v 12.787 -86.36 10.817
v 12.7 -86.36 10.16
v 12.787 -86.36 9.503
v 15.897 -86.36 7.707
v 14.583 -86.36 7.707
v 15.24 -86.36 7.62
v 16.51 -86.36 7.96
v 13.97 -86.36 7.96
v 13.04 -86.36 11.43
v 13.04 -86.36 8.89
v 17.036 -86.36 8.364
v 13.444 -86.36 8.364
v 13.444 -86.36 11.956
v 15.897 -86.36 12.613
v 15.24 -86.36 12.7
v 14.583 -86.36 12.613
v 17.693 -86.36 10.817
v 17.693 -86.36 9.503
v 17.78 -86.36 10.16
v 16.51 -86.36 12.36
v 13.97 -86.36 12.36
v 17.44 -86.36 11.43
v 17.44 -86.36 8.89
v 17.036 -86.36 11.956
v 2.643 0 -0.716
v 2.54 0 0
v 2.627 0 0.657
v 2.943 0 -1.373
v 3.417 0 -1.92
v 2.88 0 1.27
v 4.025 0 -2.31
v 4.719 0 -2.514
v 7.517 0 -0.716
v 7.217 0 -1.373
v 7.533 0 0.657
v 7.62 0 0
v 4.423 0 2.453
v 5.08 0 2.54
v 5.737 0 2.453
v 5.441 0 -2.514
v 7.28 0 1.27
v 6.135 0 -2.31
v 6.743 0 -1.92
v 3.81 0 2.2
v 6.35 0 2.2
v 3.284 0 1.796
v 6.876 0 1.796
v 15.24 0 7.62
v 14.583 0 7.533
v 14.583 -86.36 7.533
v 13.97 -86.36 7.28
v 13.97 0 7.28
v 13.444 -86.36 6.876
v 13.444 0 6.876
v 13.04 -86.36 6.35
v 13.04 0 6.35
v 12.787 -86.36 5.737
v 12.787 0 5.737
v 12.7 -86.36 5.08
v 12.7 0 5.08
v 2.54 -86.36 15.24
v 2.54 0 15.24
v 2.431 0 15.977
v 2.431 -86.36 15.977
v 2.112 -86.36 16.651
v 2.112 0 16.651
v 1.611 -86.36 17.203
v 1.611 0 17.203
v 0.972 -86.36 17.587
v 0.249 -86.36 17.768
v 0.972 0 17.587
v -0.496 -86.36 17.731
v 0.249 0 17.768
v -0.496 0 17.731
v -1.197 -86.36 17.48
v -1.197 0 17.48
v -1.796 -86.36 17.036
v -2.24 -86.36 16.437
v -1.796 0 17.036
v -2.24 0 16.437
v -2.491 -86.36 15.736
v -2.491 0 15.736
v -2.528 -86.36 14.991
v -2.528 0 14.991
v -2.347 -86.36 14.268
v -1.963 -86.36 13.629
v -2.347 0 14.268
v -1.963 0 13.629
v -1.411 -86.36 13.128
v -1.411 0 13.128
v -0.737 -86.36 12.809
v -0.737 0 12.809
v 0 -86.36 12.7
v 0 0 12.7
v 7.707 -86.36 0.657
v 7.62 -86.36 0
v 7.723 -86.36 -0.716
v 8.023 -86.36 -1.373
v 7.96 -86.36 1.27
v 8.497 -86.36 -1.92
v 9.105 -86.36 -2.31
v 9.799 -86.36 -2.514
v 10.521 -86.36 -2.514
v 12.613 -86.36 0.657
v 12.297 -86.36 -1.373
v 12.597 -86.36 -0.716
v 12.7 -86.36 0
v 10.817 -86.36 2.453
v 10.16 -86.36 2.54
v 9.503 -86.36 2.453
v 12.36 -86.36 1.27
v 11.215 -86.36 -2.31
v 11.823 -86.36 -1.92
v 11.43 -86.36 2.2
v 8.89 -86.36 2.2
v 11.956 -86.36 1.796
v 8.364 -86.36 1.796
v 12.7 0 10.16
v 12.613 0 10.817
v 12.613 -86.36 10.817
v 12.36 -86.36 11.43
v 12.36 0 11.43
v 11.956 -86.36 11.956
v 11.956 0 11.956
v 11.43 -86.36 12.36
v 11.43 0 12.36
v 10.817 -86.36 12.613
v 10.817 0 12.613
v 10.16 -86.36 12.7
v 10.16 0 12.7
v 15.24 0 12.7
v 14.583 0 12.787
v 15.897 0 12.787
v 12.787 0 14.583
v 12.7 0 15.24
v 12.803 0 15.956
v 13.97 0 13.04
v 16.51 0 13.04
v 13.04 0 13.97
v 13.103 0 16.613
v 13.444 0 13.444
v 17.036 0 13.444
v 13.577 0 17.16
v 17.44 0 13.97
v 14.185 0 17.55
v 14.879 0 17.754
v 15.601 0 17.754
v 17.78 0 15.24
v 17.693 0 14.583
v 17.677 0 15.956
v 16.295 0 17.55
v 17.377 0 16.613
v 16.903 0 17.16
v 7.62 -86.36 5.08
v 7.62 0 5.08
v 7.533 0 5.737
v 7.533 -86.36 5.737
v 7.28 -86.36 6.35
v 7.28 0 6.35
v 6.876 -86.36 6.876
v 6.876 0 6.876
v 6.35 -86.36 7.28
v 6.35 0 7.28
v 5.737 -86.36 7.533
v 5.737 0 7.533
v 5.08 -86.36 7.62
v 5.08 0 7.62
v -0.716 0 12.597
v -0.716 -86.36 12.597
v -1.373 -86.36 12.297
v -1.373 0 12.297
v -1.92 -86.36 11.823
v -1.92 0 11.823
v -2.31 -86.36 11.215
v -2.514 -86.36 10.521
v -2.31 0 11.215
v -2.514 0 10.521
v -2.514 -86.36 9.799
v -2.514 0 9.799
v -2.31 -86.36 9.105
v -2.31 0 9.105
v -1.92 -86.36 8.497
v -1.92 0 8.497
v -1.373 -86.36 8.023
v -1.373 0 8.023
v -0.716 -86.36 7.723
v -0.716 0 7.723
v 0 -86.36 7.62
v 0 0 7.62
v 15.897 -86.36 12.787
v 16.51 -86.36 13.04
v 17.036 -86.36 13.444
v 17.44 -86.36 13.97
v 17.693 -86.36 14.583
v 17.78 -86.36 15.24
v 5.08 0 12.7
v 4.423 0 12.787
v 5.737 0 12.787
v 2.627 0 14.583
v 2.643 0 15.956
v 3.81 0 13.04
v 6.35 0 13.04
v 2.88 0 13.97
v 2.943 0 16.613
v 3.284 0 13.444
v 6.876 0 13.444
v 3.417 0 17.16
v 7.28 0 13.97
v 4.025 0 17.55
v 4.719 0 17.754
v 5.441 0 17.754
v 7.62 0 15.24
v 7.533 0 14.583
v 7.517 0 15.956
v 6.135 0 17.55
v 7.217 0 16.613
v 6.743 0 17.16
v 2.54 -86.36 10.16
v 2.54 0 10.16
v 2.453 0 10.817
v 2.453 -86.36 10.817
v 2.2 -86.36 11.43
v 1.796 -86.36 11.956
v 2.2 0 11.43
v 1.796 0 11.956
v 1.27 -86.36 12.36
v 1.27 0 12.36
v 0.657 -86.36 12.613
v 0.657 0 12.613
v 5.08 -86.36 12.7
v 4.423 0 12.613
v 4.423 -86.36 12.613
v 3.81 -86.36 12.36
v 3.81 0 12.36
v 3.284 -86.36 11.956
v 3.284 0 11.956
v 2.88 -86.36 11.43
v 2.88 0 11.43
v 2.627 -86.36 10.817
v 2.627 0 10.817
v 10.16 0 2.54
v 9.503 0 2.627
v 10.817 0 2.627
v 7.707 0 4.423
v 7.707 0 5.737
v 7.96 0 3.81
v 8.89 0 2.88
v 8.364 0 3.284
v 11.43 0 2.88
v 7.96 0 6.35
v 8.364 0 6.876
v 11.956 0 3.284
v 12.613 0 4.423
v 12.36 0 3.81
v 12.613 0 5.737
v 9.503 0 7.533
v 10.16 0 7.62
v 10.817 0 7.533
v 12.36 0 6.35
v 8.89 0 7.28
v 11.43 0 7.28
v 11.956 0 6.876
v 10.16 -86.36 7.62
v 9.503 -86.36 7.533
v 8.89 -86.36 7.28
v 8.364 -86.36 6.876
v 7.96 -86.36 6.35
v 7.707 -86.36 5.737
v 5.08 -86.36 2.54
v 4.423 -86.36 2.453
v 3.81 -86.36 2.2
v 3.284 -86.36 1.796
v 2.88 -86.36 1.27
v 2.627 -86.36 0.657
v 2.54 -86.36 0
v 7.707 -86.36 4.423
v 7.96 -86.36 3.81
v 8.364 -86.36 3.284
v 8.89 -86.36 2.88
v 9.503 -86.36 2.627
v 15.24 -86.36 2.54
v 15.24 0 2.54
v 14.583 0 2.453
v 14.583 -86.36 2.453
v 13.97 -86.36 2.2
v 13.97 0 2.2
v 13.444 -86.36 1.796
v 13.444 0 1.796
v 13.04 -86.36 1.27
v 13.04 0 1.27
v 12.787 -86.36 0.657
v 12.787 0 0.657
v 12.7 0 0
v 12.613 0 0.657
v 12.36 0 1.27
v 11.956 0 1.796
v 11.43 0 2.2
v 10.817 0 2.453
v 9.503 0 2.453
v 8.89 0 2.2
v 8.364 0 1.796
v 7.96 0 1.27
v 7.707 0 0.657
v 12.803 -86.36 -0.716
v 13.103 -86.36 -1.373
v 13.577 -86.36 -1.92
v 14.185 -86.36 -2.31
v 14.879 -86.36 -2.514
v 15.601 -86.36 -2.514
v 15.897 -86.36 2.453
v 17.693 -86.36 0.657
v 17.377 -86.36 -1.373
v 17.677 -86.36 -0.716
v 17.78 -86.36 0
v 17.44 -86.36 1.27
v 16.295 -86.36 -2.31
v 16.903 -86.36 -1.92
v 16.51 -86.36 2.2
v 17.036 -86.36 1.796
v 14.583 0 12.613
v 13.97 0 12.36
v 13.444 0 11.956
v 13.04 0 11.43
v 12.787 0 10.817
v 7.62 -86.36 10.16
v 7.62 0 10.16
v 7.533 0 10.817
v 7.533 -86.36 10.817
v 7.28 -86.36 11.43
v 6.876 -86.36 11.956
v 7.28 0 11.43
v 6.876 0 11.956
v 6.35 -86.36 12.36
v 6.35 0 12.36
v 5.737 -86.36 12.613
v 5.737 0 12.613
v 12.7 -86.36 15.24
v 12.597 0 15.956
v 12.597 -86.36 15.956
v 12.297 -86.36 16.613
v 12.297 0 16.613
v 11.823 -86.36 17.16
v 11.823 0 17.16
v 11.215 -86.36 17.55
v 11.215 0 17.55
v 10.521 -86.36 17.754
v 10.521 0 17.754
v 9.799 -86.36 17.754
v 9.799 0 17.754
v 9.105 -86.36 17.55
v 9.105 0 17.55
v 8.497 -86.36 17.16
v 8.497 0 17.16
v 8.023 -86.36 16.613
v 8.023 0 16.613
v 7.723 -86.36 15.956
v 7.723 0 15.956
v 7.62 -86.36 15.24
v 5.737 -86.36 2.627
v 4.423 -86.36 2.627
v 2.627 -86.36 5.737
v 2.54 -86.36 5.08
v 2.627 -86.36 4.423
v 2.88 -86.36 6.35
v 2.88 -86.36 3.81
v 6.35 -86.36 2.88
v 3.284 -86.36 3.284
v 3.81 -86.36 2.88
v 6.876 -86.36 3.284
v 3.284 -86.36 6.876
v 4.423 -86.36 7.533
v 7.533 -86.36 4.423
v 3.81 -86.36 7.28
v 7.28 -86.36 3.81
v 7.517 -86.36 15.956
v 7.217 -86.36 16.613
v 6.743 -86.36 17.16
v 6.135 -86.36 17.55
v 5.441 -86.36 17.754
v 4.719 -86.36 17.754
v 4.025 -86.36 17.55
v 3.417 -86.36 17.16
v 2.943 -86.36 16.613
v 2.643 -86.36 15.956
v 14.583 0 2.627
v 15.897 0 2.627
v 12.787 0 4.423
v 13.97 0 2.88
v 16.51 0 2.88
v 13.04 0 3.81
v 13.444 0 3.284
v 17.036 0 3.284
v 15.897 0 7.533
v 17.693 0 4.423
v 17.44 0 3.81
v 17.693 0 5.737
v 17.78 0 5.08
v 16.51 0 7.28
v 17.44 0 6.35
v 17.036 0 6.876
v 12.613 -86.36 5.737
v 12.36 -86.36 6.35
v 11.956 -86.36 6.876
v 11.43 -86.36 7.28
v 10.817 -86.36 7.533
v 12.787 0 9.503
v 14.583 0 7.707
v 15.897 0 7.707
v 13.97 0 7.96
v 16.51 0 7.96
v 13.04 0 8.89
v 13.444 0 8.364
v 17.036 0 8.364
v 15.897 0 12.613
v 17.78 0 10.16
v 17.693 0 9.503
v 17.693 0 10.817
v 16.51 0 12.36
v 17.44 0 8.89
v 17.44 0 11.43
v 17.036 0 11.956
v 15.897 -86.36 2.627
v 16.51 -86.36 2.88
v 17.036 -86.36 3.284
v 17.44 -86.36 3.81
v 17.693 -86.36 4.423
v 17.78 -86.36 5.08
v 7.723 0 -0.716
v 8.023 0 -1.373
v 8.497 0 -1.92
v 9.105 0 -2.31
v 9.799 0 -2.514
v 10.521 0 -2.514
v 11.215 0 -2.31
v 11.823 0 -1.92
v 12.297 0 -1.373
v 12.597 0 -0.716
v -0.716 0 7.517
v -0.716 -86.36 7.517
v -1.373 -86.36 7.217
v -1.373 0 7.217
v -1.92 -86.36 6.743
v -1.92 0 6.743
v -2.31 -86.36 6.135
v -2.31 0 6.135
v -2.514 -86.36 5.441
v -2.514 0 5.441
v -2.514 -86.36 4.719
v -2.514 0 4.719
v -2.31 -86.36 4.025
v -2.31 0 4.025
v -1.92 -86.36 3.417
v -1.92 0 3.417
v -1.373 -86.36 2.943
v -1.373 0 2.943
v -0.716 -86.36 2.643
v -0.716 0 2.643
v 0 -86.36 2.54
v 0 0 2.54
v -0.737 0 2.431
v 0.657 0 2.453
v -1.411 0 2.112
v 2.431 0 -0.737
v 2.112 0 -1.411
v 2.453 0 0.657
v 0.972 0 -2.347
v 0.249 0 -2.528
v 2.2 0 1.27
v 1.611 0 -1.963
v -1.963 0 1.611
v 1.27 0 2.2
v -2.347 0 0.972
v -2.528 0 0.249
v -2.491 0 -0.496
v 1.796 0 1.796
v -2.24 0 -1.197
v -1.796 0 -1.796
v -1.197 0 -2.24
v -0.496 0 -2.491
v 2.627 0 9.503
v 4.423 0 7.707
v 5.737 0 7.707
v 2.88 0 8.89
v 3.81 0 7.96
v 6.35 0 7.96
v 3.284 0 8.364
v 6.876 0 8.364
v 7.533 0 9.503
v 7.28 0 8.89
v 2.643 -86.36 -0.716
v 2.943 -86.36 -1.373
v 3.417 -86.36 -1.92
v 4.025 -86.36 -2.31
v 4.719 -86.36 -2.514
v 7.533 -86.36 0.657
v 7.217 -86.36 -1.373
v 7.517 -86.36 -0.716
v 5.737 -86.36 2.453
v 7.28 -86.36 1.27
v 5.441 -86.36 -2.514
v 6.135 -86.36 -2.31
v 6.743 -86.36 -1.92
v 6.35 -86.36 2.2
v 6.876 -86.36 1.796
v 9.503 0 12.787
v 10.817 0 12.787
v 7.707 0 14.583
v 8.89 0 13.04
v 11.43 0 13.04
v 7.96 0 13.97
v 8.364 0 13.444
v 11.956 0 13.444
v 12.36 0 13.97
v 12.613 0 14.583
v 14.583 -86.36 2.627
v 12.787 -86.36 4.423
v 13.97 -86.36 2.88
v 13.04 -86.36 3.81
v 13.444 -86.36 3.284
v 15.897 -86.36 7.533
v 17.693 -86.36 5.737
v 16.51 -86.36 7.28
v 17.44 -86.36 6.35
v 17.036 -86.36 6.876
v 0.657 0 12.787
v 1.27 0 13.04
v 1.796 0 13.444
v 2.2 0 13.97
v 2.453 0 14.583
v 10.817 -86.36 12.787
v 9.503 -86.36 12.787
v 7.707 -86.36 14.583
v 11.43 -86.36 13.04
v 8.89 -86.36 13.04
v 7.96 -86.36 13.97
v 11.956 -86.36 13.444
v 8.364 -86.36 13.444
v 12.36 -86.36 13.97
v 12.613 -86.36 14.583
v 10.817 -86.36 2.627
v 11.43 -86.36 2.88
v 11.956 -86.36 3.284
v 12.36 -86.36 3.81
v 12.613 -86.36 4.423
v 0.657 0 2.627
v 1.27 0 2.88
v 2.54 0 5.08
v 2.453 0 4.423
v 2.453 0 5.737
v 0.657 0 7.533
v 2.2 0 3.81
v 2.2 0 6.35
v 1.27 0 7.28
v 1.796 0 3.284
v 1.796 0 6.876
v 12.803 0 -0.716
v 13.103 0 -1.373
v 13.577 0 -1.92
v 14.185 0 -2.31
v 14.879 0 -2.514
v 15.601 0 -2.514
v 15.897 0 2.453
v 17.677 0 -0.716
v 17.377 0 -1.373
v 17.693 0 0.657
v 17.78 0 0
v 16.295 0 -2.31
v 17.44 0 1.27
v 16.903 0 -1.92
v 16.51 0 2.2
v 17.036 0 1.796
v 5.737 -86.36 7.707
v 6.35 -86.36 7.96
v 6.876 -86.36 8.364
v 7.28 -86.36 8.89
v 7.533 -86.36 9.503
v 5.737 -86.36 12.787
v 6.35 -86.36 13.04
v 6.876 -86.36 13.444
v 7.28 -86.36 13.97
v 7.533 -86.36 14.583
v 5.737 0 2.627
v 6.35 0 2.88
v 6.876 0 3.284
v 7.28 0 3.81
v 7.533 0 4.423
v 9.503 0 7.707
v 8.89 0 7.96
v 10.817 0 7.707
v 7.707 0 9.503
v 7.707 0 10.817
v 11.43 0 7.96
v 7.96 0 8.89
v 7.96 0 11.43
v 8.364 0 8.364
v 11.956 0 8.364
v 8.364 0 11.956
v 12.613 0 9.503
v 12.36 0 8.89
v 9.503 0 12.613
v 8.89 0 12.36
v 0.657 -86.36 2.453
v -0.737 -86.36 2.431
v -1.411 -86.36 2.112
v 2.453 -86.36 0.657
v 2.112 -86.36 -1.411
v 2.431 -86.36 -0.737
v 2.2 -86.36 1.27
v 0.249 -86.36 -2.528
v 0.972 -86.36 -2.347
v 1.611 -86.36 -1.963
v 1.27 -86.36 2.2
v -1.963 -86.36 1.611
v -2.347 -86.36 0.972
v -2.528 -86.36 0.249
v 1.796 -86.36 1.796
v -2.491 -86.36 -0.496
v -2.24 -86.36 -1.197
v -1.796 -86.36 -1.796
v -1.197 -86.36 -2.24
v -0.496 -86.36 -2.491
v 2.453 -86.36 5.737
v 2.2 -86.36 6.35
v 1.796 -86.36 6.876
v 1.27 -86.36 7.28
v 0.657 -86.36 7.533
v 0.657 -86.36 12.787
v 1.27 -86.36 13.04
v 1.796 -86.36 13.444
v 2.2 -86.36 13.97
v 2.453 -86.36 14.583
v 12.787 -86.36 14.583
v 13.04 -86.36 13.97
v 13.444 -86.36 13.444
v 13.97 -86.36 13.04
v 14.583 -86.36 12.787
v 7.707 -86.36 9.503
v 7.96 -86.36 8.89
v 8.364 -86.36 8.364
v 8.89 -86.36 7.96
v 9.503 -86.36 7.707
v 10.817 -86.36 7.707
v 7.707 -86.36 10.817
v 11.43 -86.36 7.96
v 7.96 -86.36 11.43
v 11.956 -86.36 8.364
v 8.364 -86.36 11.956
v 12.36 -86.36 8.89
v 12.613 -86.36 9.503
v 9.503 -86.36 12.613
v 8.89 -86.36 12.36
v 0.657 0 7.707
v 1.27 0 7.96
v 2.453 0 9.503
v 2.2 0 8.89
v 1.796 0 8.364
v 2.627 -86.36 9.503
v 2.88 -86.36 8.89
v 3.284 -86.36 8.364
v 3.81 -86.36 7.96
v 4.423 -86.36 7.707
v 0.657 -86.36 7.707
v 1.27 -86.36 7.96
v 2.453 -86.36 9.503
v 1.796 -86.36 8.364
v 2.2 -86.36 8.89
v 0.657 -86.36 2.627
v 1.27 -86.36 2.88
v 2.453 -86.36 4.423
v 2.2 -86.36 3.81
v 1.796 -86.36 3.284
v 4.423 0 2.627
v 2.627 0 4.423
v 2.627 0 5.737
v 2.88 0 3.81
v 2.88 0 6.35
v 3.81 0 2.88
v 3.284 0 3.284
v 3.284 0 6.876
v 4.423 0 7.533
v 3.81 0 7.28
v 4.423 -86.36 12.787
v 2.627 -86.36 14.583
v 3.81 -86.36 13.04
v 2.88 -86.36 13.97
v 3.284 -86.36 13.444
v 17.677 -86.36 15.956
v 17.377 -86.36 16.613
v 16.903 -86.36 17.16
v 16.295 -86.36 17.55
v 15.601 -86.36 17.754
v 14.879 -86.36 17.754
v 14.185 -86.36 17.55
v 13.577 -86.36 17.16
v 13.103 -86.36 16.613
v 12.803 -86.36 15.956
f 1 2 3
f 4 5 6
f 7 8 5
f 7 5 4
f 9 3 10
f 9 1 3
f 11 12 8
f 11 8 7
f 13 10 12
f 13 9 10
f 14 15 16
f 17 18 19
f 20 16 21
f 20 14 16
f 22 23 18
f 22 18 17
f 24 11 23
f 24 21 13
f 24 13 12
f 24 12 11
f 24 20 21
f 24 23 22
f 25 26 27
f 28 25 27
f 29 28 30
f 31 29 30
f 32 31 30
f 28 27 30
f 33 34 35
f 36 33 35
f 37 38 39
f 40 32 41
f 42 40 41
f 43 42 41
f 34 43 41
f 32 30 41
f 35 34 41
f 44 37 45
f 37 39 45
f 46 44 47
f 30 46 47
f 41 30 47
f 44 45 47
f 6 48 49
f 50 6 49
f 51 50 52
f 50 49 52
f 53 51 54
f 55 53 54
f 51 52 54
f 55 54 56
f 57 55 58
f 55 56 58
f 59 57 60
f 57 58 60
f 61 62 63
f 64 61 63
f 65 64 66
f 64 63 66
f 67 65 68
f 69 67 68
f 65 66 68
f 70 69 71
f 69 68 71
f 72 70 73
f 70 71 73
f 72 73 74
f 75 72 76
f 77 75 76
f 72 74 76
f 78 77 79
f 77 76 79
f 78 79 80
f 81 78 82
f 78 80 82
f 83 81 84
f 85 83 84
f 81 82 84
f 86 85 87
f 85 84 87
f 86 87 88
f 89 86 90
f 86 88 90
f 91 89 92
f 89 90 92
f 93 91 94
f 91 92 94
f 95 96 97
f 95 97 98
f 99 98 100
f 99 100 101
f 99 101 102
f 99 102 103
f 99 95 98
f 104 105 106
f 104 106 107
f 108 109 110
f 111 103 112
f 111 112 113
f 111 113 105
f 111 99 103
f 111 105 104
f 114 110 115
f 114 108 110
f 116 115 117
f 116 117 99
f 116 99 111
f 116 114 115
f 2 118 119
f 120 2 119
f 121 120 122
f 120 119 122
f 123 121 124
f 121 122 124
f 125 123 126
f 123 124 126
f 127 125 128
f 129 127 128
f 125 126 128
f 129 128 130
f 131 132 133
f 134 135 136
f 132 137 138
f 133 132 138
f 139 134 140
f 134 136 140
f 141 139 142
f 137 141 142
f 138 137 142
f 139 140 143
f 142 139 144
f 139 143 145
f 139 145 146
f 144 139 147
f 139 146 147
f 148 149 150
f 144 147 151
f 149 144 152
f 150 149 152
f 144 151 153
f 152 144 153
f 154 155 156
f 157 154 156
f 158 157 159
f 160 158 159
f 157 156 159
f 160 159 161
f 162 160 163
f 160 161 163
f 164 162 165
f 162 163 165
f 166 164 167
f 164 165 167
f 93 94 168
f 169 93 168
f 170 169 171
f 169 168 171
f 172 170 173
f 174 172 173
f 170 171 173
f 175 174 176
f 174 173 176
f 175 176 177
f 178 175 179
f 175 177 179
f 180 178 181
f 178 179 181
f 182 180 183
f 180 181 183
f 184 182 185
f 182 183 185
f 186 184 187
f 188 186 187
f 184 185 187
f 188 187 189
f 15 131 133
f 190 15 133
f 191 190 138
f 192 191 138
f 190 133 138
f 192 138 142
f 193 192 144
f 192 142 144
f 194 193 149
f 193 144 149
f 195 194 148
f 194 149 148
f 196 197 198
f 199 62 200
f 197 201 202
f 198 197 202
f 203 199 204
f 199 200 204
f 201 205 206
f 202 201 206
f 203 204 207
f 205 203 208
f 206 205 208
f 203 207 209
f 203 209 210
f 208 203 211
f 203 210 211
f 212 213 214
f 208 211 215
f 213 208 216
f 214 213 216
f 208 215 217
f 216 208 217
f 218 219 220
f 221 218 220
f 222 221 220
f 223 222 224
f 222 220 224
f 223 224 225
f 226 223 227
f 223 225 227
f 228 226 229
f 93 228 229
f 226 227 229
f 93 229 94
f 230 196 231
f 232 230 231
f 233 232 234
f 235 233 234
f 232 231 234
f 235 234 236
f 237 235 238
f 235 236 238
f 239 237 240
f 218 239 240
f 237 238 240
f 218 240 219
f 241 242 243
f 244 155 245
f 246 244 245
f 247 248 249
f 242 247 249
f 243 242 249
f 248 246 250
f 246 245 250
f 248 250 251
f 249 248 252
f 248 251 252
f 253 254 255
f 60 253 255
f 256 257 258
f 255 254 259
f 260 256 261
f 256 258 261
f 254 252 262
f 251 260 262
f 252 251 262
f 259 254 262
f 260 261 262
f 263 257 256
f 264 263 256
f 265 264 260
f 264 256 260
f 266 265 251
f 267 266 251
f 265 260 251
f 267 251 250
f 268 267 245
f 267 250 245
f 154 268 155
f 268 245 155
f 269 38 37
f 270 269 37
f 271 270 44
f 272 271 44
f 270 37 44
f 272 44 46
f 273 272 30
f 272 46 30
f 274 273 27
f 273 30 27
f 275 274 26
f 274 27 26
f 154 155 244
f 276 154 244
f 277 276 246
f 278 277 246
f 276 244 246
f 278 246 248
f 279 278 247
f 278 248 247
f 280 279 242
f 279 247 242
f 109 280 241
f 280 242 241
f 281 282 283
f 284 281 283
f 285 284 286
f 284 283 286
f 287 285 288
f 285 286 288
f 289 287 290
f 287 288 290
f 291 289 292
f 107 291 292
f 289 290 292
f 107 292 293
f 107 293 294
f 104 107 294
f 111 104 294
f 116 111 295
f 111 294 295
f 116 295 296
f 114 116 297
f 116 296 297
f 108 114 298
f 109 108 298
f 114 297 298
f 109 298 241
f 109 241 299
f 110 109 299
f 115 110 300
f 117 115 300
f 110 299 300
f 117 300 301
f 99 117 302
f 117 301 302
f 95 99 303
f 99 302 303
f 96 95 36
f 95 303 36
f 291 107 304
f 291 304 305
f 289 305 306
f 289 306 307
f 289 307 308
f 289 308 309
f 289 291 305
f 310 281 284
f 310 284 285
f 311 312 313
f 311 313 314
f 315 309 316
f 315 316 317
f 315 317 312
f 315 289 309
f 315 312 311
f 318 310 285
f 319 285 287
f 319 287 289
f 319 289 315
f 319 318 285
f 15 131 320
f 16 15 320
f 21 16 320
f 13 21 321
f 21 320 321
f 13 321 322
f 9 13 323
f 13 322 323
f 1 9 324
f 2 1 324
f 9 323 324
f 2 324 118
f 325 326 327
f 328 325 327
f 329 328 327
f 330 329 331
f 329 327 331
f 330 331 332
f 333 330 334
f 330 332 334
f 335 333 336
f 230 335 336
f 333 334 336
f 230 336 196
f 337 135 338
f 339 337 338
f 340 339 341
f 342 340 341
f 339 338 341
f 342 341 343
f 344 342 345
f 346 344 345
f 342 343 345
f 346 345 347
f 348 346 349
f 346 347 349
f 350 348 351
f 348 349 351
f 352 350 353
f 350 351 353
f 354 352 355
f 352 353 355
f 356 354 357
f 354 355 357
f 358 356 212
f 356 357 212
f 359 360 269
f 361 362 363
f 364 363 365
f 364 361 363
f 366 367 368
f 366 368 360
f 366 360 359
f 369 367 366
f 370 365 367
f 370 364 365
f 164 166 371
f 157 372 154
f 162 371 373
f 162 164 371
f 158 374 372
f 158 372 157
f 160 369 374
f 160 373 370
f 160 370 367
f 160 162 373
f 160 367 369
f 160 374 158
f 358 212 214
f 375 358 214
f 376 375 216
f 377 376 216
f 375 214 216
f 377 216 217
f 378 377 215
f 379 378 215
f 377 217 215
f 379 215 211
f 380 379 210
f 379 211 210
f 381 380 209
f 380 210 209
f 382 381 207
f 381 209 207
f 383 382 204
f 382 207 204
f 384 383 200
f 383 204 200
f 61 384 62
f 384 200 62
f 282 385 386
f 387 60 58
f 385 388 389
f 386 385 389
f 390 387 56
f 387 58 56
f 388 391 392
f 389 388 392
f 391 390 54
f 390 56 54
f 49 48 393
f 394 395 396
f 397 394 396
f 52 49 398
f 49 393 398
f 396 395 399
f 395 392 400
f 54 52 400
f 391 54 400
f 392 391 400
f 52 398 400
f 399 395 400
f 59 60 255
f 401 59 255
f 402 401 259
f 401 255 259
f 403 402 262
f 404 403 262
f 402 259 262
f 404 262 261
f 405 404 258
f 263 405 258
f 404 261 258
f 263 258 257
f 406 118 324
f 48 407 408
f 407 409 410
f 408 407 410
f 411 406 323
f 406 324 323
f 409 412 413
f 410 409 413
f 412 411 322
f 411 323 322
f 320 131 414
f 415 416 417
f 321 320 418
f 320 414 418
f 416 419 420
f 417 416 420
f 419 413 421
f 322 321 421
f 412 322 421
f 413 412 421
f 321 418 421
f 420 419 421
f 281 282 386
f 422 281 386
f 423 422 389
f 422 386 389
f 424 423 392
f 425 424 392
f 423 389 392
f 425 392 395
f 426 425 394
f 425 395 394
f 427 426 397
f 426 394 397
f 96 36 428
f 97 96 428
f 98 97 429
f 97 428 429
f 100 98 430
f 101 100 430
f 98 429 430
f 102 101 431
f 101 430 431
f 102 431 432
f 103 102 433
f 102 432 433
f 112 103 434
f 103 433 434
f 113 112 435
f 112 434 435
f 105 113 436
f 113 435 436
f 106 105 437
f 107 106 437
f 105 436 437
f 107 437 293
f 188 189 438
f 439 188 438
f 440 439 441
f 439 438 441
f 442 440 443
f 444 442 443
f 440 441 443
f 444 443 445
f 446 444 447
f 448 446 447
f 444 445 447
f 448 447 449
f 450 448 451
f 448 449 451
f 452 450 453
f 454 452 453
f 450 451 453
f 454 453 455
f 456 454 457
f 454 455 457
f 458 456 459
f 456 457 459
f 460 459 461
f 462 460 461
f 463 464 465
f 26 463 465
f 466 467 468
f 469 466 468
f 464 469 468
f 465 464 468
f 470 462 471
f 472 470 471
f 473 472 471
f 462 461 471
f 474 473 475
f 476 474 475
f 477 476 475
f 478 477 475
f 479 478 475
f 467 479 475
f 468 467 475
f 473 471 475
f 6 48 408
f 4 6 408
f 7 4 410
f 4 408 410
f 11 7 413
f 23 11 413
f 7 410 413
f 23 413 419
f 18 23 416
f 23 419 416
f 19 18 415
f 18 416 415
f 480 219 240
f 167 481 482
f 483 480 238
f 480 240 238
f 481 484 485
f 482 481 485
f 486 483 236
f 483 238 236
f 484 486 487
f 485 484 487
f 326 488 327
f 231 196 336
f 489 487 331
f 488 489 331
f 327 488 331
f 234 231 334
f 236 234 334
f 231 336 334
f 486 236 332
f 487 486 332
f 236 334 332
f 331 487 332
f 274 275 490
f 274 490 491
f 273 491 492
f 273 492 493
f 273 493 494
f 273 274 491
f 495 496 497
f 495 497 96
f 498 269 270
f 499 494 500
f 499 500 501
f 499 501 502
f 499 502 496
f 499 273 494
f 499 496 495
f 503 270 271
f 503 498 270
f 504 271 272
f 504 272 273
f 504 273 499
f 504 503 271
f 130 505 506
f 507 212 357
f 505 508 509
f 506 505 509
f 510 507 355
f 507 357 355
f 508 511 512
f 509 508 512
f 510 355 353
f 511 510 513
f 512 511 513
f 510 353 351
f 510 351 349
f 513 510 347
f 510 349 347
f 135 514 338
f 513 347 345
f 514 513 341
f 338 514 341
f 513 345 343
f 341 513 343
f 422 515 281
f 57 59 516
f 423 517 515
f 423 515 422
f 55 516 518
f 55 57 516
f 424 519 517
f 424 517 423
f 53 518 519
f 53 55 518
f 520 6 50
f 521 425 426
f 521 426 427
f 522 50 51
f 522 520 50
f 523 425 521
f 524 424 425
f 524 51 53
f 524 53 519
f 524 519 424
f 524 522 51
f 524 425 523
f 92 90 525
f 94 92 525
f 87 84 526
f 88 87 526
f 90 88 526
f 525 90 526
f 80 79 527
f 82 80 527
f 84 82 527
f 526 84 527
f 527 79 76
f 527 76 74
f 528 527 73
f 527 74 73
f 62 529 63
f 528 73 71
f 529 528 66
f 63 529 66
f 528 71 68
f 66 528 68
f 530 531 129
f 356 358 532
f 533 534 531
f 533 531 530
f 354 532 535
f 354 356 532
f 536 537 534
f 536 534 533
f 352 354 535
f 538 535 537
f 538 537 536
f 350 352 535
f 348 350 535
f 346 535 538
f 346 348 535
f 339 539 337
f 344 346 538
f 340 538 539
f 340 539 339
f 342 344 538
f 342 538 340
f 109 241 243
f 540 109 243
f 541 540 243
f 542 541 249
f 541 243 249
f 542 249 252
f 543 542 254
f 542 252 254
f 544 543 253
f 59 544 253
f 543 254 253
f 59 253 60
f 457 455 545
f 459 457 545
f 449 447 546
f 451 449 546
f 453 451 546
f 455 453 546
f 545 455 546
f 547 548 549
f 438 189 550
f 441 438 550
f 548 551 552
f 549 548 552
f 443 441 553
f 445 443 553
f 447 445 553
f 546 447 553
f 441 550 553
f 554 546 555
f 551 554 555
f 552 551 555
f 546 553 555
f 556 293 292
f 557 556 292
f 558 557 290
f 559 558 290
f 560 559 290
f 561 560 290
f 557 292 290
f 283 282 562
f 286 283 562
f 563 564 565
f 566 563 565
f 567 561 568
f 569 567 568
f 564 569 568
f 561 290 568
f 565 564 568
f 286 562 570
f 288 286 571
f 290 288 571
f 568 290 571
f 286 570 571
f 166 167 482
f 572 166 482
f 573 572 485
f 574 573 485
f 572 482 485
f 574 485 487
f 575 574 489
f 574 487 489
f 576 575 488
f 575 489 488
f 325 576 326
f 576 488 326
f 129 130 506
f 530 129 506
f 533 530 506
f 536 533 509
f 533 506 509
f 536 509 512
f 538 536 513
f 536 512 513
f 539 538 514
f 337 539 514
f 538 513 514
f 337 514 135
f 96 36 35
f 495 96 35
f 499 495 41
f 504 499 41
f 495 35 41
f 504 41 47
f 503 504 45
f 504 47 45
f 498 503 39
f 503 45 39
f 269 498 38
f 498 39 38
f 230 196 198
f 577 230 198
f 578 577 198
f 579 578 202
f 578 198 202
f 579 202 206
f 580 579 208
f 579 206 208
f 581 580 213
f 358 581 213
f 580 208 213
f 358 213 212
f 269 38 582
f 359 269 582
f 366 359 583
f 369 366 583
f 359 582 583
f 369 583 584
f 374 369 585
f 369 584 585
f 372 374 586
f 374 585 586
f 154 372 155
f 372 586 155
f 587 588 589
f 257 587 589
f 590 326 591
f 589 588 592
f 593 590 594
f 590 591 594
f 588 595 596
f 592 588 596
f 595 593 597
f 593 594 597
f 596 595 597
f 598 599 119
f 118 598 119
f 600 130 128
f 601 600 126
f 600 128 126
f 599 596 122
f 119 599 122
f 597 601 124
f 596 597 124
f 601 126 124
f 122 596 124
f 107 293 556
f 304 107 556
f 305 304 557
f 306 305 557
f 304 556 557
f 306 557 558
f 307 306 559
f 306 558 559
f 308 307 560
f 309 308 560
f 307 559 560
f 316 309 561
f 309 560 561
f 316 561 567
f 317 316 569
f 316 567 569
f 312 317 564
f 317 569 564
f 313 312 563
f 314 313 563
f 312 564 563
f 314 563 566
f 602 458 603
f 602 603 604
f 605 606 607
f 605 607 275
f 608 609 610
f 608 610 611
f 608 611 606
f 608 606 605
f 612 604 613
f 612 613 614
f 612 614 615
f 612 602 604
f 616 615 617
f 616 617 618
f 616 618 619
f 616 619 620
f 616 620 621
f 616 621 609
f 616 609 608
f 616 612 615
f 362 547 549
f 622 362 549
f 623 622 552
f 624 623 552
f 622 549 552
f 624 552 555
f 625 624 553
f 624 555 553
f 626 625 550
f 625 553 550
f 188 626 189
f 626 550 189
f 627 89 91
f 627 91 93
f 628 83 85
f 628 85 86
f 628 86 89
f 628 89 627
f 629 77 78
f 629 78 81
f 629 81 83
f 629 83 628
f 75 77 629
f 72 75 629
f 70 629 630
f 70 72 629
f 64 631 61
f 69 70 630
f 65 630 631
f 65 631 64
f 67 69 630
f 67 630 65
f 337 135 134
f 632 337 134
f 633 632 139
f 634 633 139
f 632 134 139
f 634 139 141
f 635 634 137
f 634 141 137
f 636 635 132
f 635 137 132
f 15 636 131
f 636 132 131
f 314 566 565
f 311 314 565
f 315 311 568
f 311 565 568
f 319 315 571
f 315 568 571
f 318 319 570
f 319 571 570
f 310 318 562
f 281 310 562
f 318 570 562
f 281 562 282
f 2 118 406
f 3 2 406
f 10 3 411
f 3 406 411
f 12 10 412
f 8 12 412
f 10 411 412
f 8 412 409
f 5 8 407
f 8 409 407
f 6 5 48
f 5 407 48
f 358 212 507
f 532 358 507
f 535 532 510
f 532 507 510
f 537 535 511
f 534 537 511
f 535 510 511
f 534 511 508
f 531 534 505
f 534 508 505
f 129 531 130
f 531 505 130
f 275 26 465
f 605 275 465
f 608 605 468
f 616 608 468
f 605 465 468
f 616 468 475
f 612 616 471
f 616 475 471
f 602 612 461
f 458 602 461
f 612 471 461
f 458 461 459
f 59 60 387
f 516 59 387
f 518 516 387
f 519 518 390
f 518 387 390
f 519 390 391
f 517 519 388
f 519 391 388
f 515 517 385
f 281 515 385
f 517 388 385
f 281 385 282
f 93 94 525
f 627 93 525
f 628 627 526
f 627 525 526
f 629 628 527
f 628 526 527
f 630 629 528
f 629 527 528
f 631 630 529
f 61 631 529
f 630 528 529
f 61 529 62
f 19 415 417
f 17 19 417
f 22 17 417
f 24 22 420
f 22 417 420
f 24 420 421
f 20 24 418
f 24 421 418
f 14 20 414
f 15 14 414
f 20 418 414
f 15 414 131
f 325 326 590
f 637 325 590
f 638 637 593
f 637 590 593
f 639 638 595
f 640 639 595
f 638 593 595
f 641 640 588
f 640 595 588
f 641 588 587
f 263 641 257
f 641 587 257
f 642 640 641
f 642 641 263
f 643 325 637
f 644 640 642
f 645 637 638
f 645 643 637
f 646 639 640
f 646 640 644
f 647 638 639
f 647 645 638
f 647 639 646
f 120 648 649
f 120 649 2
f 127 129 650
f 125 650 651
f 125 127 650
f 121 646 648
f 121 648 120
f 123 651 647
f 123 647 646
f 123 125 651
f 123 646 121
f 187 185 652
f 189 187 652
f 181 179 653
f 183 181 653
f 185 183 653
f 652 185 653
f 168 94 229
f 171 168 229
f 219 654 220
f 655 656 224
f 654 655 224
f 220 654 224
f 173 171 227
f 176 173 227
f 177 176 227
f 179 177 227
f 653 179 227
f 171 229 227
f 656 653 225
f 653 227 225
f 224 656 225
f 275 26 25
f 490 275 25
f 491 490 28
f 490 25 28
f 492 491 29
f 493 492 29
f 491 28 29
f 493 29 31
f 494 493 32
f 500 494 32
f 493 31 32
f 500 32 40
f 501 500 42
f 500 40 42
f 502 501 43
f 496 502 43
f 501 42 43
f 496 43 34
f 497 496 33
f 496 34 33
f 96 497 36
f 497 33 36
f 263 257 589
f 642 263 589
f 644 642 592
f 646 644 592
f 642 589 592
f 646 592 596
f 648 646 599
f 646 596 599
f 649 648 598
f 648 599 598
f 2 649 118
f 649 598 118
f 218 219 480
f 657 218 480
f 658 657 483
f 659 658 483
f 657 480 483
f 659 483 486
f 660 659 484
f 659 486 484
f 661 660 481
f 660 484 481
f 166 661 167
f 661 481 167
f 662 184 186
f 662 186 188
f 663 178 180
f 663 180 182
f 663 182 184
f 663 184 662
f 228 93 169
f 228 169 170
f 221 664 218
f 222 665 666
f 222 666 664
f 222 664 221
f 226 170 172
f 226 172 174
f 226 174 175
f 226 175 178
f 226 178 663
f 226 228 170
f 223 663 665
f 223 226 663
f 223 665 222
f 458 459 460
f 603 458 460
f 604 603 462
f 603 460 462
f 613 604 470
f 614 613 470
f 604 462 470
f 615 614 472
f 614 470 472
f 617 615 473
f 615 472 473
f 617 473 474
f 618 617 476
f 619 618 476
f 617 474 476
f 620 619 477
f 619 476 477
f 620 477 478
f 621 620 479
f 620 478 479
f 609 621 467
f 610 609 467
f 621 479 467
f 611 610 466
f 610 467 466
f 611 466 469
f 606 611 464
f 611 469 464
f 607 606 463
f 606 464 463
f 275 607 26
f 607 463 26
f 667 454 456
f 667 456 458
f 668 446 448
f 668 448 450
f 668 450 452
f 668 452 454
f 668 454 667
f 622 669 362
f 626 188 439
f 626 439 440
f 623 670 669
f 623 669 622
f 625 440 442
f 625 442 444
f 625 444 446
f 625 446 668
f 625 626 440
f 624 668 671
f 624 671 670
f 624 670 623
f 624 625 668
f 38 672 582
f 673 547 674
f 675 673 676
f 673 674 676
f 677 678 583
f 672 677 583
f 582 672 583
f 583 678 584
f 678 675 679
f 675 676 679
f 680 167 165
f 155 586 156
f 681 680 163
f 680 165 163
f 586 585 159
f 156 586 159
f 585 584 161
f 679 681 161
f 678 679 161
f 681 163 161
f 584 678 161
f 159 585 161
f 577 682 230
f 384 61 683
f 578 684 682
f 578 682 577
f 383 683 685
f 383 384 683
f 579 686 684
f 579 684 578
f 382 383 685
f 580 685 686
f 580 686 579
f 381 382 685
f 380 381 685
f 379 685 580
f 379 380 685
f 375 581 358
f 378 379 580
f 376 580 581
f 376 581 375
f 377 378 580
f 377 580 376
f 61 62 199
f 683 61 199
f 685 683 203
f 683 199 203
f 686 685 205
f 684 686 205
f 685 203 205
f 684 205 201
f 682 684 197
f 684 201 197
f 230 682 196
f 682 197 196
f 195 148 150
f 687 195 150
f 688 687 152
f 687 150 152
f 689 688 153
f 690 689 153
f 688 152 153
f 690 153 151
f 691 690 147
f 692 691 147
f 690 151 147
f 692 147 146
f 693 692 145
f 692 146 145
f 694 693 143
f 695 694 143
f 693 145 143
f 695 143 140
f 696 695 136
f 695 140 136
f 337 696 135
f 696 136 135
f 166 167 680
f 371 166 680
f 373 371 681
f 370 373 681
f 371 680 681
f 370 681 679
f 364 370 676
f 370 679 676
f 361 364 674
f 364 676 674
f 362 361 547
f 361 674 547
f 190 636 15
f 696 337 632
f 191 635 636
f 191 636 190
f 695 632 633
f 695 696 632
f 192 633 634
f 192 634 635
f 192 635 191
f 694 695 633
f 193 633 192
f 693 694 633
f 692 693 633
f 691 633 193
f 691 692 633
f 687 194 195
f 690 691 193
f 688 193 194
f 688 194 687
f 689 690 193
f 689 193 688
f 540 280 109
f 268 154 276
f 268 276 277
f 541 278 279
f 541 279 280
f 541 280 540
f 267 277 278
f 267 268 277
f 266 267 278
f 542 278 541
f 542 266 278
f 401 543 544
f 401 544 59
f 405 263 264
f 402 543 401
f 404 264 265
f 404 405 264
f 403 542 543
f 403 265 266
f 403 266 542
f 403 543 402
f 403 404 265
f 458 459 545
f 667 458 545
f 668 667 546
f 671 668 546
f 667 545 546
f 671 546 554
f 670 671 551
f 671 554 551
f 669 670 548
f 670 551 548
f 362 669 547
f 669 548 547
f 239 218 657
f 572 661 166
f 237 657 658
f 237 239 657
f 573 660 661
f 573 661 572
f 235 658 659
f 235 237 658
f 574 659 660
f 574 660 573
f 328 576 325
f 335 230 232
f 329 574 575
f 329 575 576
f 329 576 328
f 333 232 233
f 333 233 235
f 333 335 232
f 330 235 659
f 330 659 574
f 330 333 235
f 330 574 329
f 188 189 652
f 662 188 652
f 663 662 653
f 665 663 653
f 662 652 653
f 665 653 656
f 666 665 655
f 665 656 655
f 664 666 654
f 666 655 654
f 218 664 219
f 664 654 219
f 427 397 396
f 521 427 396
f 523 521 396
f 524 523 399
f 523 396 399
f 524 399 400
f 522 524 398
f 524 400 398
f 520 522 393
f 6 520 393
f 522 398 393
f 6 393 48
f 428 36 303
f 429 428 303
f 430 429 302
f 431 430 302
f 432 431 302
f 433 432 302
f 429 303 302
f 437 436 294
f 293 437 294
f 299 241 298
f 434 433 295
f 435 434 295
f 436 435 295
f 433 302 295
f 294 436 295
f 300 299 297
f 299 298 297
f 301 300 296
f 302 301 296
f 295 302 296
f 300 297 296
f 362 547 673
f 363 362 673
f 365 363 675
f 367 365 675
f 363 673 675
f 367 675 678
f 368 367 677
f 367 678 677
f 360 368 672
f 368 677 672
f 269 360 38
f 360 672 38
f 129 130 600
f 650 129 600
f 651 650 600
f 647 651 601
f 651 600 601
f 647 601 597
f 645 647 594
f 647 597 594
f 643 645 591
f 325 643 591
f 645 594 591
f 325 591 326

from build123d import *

# Parameters (mm, degrees)
F1_DEPTH = 86.36


with BuildPart() as f1:
    # F0 (on Front) → F1 (new body)
    with BuildSketch(Plane.XZ):
        with BuildLine():
            ThreePointArc((0, 2.54), (-1.796051, -1.796051), (2.54, 0))
            ThreePointArc((2.54, 0), (1.796051, 1.796051), (0, 2.54))
        make_face()
        with BuildLine():
            ThreePointArc((2.54, 15.24), (-1.796051, 17.036051), (0, 12.7))
            ThreePointArc((0, 12.7), (1.796051, 13.443949), (2.54, 15.24))
        make_face()
        with BuildLine():
            ThreePointArc((15.24, 2.54), (13.443949, 1.796051), (12.7, 0))
            ThreePointArc((12.7, 0), (15.24, -2.54), (17.78, 0))
            ThreePointArc((17.78, 0), (17.036051, 1.796051), (15.24, 2.54))
        make_face()
        with BuildLine():
            ThreePointArc((12.7, 15.24), (13.443949, 13.443949), (15.24, 12.7))
            ThreePointArc((15.24, 12.7), (17.036051, 13.443949), (17.78, 15.24))
            ThreePointArc((17.78, 15.24), (15.24, 17.78), (12.7, 15.24))
        make_face()
        with BuildLine():
            ThreePointArc((0, 7.62), (-2.54, 5.08), (0, 2.54))
            ThreePointArc((0, 2.54), (1.796051, 3.283949), (2.54, 5.08))
            ThreePointArc((2.54, 5.08), (1.796051, 6.876051), (0, 7.62))
        make_face()
        with BuildLine():
            ThreePointArc((0, 12.7), (-2.54, 10.16), (0, 7.62))
            ThreePointArc((0, 7.62), (1.796051, 8.363949), (2.54, 10.16))
            ThreePointArc((2.54, 10.16), (1.796051, 11.956051), (0, 12.7))
        make_face()
        with BuildLine():
            ThreePointArc((5.08, 2.54), (3.283949, 1.796051), (2.54, 0))
            ThreePointArc((2.54, 0), (5.08, -2.54), (7.62, 0))
            ThreePointArc((7.62, 0), (6.876051, 1.796051), (5.08, 2.54))
        make_face()
        with BuildLine():
            ThreePointArc((7.62, 15.24), (5.08, 17.78), (2.54, 15.24))
            ThreePointArc((2.54, 15.24), (3.283949, 13.443949), (5.08, 12.7))
            ThreePointArc((5.08, 12.7), (6.876051, 13.443949), (7.62, 15.24))
        make_face()
        with BuildLine():
            ThreePointArc((10.16, 2.54), (8.363949, 1.796051), (7.62, 0))
            ThreePointArc((7.62, 0), (10.16, -2.54), (12.7, 0))
            ThreePointArc((12.7, 0), (11.956051, 1.796051), (10.16, 2.54))
        make_face()
        with BuildLine():
            ThreePointArc((12.7, 15.24), (10.16, 17.78), (7.62, 15.24))
            ThreePointArc((7.62, 15.24), (8.363949, 13.443949), (10.16, 12.7))
            ThreePointArc((10.16, 12.7), (11.956051, 13.443949), (12.7, 15.24))
        make_face()
        with BuildLine():
            ThreePointArc((12.7, 5.08), (13.443949, 3.283949), (15.24, 2.54))
            ThreePointArc((15.24, 2.54), (17.036051, 3.283949), (17.78, 5.08))
            ThreePointArc((17.78, 5.08), (17.036051, 6.876051), (15.24, 7.62))
            ThreePointArc((15.24, 7.62), (13.443949, 6.876051), (12.7, 5.08))
        make_face()
        with BuildLine():
            ThreePointArc((12.7, 10.16), (13.443949, 8.363949), (15.24, 7.62))
            ThreePointArc((15.24, 7.62), (17.036051, 8.363949), (17.78, 10.16))
            ThreePointArc((17.78, 10.16), (17.036051, 11.956051), (15.24, 12.7))
            ThreePointArc((15.24, 12.7), (13.443949, 11.956051), (12.7, 10.16))
        make_face()
        with BuildLine():
            ThreePointArc((7.62, 5.08), (8.363949, 3.283949), (10.16, 2.54))
            ThreePointArc((10.16, 2.54), (11.956051, 3.283949), (12.7, 5.08))
            ThreePointArc((12.7, 5.08), (11.956051, 6.876051), (10.16, 7.62))
            ThreePointArc((10.16, 7.62), (8.363949, 6.876051), (7.62, 5.08))
        make_face()
        with BuildLine():
            ThreePointArc((2.54, 5.08), (3.283949, 3.283949), (5.08, 2.54))
            ThreePointArc((5.08, 2.54), (6.876051, 3.283949), (7.62, 5.08))
            ThreePointArc((7.62, 5.08), (6.876051, 6.876051), (5.08, 7.62))
            ThreePointArc((5.08, 7.62), (3.283949, 6.876051), (2.54, 5.08))
        make_face()
        with BuildLine():
            ThreePointArc((7.62, 10.16), (8.363949, 8.363949), (10.16, 7.62))
            ThreePointArc((10.16, 7.62), (11.956051, 8.363949), (12.7, 10.16))
            ThreePointArc((12.7, 10.16), (11.956051, 11.956051), (10.16, 12.7))
            ThreePointArc((10.16, 12.7), (8.363949, 11.956051), (7.62, 10.16))
        make_face()
        with BuildLine():
            ThreePointArc((5.08, 12.7), (3.283949, 11.956051), (2.54, 10.16))
            ThreePointArc((2.54, 10.16), (3.283949, 8.363949), (5.08, 7.62))
            ThreePointArc((5.08, 7.62), (6.876051, 8.363949), (7.62, 10.16))
            ThreePointArc((7.62, 10.16), (6.876051, 11.956051), (5.08, 12.7))
        make_face()
    extrude(amount=F1_DEPTH)


solid = f1.part
